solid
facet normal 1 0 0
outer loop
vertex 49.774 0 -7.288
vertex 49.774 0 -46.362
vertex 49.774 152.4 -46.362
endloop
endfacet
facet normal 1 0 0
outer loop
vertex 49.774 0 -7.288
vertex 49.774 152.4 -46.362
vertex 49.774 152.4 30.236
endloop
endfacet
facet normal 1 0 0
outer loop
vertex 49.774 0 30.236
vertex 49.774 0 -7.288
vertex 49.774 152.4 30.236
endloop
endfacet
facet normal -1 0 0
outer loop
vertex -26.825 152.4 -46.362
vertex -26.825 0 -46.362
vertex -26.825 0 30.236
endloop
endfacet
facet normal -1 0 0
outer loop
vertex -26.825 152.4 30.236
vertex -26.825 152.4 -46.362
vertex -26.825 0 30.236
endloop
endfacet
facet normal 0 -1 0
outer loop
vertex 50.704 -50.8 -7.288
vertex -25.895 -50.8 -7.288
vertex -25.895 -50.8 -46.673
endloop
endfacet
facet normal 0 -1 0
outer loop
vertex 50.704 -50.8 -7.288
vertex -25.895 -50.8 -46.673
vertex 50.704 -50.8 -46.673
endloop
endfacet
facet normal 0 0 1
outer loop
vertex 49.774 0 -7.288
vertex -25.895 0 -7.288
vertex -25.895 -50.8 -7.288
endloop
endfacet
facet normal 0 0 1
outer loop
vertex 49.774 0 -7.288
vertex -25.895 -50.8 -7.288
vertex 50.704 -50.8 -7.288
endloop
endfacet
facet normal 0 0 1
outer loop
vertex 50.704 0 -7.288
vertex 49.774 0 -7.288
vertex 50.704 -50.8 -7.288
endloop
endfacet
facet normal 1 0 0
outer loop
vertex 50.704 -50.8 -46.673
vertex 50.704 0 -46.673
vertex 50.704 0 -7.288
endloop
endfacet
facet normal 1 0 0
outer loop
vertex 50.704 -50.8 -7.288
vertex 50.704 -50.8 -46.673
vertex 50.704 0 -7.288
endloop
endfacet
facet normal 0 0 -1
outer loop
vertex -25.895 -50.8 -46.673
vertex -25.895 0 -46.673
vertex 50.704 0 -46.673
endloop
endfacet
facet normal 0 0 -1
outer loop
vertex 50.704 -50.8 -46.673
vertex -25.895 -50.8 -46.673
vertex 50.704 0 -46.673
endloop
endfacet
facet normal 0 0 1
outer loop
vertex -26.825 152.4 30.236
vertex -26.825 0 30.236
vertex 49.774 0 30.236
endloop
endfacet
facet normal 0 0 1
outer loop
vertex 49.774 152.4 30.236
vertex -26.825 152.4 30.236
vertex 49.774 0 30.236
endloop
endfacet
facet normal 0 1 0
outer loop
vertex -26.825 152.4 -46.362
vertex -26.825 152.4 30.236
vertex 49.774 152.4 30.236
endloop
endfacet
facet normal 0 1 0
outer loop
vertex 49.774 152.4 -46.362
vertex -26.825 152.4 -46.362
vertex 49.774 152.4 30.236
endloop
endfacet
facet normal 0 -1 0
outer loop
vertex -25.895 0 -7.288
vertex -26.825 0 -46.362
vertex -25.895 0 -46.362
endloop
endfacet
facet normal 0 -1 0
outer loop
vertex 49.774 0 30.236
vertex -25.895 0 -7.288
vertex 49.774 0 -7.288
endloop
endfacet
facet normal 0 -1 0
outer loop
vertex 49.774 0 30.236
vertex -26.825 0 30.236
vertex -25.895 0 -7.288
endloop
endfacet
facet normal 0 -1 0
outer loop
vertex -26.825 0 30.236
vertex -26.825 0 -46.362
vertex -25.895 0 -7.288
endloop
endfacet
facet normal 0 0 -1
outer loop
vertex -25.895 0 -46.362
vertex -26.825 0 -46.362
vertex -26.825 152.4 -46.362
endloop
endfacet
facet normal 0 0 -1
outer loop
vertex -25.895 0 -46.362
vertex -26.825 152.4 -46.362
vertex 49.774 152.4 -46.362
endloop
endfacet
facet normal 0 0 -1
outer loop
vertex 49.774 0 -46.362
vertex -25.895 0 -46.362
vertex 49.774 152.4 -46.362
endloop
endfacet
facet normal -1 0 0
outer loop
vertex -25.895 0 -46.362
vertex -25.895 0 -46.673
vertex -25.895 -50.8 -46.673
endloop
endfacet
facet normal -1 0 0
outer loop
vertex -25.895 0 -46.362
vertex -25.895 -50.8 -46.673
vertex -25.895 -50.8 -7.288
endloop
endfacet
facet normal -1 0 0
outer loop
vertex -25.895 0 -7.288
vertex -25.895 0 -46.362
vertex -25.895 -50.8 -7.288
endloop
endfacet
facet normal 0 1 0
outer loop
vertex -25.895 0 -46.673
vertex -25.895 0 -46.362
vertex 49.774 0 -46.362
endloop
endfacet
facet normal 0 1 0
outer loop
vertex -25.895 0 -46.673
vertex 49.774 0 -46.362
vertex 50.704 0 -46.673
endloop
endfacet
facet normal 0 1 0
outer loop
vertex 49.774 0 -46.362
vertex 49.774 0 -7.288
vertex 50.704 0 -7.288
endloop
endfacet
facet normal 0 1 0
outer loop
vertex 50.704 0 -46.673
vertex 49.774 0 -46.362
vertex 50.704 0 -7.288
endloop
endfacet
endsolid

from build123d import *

# Parameters (mm, degrees)
F0_W     = 76.598722
F0_H     = 76.598718
F1_DEPTH = 152.4
F2_W     = 76.598719
F2_H     = 39.384769
F3_DEPTH = 50.8


with BuildPart() as f1:
    # F0 (on Front) → F1 (new body)
    with BuildSketch(Plane.XZ):
        with Locations((11.474302, -8.063022)):
            Rectangle(F0_W, F0_H)
    extrude(amount=-F1_DEPTH)

    # F2 (on Front) → F3 (join)
    with BuildSketch(Plane.XZ):
        with Locations((12.40465, -26.980116)):
            Rectangle(F2_W, F2_H)
    extrude(amount=F3_DEPTH)


solid = f1.part
